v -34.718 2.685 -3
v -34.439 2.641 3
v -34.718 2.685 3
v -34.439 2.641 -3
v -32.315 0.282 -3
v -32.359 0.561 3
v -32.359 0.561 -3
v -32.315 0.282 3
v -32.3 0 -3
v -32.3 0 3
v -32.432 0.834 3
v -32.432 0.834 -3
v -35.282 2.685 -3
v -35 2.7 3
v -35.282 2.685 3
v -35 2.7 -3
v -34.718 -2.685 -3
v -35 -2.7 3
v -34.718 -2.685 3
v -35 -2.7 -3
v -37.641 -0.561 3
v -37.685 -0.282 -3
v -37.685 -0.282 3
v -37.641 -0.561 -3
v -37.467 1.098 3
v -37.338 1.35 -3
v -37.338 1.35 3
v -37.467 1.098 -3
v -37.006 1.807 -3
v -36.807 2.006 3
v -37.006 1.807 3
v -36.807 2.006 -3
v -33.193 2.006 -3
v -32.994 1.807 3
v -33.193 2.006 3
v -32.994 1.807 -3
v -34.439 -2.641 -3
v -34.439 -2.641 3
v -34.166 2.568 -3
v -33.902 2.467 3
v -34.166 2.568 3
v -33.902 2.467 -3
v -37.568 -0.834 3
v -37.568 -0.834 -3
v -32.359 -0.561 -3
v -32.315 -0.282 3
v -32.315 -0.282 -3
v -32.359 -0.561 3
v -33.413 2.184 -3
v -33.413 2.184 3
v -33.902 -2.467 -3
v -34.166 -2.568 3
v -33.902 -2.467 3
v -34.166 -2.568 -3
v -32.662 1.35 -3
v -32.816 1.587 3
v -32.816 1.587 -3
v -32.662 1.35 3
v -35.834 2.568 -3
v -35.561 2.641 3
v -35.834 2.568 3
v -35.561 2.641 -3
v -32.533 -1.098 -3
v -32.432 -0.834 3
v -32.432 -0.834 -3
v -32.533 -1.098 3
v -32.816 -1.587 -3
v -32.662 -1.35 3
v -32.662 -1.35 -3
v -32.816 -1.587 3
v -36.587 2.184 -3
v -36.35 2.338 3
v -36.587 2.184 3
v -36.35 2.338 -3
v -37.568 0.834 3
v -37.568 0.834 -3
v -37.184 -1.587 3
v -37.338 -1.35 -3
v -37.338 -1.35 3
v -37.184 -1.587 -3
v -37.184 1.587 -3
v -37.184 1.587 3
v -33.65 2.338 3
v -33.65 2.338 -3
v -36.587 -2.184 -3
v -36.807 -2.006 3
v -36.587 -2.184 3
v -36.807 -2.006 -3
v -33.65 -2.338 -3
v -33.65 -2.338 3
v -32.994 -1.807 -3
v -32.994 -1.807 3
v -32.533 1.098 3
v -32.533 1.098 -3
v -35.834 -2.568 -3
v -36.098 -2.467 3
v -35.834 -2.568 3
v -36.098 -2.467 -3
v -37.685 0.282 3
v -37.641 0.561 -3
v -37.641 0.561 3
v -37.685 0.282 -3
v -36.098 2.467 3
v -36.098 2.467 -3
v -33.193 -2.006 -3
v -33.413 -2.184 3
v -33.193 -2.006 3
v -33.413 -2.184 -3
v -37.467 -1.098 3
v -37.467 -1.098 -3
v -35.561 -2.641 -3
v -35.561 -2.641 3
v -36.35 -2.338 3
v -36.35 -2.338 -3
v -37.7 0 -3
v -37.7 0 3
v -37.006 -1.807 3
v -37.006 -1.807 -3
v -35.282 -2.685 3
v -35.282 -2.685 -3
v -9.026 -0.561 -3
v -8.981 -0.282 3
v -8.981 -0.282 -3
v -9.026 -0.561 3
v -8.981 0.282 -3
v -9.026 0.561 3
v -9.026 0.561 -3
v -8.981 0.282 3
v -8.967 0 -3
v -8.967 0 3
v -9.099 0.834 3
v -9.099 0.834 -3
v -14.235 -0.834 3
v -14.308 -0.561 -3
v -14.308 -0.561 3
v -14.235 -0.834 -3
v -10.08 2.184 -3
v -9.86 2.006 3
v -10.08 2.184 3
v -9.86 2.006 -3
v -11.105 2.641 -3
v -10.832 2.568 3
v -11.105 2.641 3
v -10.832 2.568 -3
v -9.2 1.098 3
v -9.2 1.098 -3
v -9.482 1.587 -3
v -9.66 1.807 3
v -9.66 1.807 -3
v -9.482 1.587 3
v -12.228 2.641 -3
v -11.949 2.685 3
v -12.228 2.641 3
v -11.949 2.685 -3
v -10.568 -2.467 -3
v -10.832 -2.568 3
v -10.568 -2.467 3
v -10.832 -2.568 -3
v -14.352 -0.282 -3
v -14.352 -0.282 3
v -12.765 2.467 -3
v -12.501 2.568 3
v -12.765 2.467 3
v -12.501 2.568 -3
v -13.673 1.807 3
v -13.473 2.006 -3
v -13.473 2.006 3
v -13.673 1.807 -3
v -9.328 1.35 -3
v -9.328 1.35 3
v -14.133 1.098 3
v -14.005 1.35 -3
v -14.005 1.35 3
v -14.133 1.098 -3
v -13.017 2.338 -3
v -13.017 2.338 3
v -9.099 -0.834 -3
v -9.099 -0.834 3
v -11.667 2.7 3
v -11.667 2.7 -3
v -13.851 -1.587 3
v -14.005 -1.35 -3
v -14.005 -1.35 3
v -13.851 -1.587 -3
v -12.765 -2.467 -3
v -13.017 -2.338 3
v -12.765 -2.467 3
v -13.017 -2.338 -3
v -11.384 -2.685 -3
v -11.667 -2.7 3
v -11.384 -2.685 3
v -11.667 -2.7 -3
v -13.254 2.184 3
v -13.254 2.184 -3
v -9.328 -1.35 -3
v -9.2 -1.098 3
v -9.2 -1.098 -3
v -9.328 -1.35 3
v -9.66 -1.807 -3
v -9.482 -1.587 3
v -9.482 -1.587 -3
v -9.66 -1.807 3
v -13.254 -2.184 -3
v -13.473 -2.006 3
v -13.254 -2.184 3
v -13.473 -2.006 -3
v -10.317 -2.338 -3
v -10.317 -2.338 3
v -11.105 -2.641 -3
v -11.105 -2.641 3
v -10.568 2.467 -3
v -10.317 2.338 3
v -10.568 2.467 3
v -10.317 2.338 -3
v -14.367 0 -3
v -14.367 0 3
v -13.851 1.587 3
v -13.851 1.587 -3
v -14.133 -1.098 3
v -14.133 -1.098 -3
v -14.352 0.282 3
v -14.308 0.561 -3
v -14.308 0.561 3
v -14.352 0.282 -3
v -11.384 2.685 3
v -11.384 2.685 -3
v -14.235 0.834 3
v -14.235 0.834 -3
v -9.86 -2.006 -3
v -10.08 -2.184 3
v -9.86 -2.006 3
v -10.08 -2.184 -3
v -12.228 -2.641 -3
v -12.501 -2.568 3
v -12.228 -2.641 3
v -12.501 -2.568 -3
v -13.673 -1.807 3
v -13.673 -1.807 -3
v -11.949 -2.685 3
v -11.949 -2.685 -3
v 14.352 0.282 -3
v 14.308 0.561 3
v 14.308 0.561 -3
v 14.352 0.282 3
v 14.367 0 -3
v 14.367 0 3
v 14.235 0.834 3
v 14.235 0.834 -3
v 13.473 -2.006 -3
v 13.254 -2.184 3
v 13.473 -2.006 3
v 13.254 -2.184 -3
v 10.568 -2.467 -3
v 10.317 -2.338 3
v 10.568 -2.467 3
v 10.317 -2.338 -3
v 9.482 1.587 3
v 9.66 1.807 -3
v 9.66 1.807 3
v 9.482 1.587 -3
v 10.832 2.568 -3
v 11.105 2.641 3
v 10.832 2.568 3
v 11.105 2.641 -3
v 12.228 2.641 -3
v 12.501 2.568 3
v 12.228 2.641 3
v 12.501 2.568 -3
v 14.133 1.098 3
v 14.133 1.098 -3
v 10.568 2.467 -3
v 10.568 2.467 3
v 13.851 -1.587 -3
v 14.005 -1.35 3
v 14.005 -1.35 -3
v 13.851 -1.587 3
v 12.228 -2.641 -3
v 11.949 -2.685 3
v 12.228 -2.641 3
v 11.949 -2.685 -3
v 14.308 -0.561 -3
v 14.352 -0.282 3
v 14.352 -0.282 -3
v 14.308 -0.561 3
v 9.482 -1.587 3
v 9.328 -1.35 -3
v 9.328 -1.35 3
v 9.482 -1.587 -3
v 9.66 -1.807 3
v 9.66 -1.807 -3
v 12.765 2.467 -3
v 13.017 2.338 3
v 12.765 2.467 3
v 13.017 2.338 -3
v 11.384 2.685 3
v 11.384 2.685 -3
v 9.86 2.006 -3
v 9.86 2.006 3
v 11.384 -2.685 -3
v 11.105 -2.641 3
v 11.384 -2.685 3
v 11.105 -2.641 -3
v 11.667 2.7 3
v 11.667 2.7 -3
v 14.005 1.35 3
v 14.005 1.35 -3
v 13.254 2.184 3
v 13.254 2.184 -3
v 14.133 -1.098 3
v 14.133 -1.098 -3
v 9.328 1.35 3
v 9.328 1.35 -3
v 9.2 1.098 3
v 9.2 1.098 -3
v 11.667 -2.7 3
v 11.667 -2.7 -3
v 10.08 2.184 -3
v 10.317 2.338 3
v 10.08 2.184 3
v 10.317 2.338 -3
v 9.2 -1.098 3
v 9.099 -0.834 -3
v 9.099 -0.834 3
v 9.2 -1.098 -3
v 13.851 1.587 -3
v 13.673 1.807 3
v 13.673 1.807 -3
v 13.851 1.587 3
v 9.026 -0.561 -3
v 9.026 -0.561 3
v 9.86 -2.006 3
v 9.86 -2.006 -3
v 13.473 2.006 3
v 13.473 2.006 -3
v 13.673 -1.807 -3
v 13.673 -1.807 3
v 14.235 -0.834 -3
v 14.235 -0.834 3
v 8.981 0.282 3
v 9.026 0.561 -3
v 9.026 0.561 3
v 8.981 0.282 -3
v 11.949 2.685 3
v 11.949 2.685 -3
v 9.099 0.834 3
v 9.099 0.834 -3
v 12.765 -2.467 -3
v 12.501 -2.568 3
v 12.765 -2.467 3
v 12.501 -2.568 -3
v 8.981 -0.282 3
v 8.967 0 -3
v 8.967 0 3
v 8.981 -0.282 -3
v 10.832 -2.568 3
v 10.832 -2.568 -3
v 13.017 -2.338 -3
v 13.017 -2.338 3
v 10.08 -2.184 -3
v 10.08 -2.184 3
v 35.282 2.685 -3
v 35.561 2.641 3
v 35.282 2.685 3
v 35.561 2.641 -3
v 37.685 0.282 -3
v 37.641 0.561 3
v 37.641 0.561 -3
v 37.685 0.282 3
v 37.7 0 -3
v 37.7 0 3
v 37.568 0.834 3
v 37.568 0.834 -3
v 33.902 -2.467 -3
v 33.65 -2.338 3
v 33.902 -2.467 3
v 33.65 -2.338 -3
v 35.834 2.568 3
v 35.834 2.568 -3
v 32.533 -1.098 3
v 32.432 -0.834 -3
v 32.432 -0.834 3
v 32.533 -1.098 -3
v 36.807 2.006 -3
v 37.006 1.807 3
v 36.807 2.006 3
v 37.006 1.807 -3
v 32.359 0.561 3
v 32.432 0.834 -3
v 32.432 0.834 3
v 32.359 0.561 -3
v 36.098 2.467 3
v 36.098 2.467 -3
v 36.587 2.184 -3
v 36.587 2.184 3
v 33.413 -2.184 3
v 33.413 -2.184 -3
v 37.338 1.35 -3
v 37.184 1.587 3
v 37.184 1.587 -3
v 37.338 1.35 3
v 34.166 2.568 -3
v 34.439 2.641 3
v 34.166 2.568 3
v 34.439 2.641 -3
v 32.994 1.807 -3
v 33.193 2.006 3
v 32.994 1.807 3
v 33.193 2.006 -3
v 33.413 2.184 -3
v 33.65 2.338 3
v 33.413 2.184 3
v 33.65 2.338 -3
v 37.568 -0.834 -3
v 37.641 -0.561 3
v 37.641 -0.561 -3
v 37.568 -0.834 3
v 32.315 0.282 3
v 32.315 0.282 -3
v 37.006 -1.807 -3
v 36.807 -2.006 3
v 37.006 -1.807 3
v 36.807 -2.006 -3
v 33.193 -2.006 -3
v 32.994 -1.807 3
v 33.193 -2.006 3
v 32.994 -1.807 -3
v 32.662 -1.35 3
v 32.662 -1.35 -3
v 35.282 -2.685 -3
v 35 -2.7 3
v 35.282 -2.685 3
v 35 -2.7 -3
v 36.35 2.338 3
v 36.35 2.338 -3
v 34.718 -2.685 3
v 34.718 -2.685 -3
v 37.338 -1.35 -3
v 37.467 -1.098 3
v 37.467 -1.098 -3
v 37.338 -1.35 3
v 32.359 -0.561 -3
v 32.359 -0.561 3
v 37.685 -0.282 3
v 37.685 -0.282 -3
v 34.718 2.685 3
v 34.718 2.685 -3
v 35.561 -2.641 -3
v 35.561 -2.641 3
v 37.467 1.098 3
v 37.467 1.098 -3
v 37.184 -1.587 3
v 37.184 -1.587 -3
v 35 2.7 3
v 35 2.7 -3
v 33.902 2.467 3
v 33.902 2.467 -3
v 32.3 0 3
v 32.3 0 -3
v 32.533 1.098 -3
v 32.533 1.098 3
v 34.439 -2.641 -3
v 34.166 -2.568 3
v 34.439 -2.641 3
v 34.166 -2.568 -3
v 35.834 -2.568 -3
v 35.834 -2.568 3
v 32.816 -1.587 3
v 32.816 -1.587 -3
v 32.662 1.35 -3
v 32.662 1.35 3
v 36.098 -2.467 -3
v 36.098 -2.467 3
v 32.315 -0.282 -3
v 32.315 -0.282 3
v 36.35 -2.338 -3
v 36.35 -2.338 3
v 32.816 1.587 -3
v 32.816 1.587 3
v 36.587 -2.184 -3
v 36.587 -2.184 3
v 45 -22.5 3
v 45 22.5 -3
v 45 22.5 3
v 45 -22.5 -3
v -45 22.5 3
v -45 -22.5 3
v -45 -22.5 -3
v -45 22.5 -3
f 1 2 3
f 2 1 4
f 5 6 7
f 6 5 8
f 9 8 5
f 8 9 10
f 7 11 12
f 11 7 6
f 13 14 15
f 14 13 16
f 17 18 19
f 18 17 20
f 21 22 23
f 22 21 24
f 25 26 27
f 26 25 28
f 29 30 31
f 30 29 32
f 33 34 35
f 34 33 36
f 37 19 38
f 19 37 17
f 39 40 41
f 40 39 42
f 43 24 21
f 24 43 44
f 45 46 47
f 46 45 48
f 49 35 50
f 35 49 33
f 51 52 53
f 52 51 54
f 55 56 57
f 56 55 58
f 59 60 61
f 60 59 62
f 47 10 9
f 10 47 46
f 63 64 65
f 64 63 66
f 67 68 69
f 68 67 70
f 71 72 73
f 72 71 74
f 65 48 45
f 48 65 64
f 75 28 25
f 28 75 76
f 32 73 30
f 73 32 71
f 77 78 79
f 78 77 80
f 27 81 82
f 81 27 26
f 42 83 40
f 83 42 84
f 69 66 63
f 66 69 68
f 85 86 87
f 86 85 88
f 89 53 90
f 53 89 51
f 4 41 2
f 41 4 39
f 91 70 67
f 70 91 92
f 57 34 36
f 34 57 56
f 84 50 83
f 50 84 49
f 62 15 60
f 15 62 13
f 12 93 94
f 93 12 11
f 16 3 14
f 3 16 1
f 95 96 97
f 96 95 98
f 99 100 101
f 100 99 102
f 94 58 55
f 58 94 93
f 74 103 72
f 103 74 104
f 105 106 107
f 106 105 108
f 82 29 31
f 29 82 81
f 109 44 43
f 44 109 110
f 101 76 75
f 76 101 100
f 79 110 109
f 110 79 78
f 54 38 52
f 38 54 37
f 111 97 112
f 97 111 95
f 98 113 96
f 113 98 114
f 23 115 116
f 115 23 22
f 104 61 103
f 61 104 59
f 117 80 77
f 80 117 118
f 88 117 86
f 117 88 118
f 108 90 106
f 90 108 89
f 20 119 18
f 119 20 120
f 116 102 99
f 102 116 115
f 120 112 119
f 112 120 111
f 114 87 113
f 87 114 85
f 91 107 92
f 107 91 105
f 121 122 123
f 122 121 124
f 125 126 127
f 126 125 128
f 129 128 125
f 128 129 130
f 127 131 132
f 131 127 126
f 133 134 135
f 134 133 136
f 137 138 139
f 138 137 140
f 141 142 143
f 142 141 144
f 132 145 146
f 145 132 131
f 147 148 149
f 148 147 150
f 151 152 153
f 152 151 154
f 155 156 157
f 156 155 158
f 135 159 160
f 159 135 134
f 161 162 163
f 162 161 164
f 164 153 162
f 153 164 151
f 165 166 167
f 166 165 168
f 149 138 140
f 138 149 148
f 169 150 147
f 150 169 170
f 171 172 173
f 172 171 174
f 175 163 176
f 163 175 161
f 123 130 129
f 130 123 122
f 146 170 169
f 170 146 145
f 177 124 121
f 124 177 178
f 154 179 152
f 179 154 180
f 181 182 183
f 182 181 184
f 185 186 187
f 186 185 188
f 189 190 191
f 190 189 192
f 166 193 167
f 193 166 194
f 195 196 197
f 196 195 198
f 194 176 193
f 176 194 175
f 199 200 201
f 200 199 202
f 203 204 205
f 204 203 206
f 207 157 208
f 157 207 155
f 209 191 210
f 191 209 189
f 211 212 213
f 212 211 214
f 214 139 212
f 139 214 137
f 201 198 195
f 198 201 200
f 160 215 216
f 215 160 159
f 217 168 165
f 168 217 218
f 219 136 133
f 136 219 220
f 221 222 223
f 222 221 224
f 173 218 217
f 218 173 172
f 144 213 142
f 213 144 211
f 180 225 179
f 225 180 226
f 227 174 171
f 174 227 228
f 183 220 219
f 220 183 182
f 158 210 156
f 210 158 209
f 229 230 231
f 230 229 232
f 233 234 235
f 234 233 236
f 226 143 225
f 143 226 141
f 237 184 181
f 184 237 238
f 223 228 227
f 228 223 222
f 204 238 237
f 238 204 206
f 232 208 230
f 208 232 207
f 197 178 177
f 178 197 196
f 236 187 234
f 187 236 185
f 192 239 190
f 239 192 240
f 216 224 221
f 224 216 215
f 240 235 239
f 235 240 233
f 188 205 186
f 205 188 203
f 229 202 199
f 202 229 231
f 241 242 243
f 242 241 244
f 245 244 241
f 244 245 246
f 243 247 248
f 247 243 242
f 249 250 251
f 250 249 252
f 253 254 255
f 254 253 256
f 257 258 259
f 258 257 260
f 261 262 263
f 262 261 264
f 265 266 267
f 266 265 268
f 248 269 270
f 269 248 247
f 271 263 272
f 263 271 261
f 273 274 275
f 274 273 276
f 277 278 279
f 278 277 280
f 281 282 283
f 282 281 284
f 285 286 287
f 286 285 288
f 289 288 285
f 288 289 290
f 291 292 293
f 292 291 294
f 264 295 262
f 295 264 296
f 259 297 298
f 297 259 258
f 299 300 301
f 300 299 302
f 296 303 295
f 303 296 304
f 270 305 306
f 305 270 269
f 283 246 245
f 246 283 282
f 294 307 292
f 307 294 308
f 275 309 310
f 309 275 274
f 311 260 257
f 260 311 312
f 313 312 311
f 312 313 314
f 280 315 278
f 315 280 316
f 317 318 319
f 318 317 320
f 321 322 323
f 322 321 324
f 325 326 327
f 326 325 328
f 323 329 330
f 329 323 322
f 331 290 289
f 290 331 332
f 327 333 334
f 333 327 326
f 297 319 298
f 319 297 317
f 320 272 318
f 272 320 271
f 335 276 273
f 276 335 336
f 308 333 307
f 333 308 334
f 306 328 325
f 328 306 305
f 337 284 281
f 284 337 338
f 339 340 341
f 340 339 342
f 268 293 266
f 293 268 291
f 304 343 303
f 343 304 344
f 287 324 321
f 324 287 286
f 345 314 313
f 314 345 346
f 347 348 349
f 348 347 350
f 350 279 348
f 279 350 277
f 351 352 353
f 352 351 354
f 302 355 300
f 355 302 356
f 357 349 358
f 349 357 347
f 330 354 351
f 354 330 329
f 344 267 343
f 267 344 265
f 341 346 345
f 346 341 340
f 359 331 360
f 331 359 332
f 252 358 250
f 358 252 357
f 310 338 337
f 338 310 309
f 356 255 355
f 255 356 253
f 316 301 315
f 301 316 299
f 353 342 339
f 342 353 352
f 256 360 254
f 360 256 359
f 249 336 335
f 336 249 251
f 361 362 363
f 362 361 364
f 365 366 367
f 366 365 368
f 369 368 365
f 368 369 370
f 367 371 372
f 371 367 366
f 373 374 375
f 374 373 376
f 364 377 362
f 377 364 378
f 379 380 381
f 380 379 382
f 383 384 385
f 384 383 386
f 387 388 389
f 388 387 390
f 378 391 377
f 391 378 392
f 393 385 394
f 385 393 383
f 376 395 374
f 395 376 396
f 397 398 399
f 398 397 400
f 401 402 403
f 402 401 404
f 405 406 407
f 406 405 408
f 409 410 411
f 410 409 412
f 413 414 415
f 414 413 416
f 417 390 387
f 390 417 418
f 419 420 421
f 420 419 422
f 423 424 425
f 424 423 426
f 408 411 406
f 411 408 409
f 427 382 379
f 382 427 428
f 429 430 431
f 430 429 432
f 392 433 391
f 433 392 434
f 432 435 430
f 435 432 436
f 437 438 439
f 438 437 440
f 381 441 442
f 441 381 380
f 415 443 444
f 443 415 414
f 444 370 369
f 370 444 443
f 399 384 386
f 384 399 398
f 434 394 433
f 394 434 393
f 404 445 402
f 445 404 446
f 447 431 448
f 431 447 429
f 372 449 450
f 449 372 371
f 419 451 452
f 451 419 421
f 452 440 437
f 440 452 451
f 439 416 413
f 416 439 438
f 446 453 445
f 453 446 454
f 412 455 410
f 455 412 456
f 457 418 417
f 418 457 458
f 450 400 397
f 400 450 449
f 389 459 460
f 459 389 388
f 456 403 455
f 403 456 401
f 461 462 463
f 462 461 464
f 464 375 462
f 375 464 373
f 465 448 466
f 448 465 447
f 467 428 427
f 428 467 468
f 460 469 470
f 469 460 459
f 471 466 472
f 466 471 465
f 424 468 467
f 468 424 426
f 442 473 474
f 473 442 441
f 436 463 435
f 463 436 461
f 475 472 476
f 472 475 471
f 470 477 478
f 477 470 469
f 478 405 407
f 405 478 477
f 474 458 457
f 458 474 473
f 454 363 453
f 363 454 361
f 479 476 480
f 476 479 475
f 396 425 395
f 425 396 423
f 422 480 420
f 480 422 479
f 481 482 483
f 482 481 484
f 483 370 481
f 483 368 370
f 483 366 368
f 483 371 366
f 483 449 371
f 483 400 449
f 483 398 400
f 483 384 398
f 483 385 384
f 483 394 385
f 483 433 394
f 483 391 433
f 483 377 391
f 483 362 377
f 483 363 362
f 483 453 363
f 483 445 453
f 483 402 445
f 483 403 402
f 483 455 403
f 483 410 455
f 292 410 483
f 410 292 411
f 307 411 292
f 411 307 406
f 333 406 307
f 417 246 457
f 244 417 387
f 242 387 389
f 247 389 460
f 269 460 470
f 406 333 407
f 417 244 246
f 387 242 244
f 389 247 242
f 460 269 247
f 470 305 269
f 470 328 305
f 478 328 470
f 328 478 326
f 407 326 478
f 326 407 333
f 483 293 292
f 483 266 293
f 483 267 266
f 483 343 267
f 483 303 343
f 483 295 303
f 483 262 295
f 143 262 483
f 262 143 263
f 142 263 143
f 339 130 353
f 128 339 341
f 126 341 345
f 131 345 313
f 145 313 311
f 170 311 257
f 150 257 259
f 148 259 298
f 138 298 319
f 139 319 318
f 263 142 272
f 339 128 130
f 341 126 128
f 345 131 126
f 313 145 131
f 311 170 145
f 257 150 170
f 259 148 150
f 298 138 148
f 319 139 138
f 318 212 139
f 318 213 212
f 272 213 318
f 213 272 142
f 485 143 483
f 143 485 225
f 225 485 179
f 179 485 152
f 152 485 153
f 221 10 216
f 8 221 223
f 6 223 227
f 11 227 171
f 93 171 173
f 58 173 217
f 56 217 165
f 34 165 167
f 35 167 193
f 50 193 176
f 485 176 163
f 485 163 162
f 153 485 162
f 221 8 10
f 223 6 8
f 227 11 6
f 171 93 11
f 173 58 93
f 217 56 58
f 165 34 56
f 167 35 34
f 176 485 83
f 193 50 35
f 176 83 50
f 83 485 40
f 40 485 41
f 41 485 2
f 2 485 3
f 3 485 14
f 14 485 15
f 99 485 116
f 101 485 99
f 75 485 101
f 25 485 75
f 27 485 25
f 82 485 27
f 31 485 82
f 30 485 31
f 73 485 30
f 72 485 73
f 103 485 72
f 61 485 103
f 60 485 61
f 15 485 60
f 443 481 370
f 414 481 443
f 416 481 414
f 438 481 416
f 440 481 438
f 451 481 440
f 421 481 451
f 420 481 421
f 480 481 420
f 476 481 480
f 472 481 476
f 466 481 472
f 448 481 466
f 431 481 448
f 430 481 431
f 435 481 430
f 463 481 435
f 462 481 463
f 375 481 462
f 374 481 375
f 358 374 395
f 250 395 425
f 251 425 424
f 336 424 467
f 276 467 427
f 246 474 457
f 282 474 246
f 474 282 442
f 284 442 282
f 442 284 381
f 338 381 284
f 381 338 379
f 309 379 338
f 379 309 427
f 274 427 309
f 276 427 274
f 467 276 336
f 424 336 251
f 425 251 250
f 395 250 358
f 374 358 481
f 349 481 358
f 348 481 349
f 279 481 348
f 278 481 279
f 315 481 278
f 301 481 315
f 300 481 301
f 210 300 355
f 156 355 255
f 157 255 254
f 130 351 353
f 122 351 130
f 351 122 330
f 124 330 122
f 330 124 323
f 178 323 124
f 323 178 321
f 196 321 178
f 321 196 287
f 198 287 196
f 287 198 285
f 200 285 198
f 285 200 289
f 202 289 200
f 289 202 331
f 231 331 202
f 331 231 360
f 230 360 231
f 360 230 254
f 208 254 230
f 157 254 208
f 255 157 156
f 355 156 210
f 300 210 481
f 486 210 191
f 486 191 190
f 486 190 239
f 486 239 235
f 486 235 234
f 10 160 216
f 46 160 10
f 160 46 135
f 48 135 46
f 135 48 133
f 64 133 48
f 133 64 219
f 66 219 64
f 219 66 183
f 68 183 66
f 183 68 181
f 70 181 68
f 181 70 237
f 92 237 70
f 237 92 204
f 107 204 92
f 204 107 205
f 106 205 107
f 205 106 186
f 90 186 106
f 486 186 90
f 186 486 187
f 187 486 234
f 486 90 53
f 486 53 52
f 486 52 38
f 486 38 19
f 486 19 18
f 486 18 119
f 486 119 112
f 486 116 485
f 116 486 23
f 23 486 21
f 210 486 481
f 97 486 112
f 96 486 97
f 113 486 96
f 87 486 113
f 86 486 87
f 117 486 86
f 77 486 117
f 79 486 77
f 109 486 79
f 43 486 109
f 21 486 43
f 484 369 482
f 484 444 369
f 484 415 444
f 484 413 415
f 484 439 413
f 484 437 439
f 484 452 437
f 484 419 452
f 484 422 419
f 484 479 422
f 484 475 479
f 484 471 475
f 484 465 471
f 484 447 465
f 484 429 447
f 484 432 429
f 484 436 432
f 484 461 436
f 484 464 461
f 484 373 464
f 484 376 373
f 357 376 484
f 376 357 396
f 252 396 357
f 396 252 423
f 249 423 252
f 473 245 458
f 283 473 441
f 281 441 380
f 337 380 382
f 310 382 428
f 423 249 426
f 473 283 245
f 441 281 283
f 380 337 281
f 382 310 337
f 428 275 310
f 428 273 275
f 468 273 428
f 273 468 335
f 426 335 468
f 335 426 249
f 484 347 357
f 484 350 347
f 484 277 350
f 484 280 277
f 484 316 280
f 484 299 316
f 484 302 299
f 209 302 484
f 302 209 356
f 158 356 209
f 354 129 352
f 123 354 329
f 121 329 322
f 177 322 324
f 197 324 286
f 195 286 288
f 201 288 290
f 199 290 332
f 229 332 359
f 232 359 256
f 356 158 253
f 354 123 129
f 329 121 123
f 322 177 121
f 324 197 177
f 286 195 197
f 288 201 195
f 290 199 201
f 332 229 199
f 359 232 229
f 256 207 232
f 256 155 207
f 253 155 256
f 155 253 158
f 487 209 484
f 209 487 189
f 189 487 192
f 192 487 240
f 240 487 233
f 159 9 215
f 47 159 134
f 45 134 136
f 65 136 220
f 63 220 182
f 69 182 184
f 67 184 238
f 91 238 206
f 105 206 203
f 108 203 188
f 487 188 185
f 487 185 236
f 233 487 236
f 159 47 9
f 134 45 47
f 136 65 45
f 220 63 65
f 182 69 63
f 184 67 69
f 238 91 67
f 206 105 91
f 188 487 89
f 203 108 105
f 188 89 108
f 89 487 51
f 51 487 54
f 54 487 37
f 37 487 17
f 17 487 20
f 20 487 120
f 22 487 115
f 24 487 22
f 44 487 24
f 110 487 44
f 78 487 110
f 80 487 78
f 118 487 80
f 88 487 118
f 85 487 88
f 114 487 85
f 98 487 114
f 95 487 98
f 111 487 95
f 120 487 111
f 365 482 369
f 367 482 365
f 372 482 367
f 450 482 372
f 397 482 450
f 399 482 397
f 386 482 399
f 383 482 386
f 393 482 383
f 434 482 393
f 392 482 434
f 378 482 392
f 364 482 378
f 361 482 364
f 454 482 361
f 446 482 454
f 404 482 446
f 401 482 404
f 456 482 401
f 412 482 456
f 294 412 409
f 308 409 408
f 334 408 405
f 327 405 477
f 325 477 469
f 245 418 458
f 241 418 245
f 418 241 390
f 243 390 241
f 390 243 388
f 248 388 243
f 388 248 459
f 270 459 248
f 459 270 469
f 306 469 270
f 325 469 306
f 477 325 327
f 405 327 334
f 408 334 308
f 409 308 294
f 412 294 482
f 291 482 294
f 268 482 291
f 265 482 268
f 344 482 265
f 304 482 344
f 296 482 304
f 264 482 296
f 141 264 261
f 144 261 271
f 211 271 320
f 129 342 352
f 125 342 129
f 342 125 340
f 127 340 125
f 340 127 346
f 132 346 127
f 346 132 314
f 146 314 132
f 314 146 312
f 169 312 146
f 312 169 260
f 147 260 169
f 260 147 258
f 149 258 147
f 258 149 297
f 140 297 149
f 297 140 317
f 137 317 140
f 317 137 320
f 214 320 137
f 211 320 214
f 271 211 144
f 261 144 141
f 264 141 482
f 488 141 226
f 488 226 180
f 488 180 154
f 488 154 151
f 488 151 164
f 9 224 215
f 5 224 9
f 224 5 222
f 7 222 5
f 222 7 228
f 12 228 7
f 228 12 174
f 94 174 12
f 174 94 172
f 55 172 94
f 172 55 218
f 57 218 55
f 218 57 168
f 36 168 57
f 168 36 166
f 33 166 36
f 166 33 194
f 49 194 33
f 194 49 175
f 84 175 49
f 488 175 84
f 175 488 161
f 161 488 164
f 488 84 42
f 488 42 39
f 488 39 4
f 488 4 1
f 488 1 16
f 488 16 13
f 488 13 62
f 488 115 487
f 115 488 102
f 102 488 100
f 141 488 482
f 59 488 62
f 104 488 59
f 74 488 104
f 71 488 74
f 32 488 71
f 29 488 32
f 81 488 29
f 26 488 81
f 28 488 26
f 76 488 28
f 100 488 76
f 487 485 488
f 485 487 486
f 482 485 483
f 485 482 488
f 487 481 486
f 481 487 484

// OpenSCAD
// Multi-hole mounting plate.
$fn = 60;
eps = 0.02;
plate_l = 90;
plate_w = 45;
plate_t = 6;
hole_d = 5.4;
edge = 10;
difference() {
    cube([plate_l, plate_w, plate_t], center = true);
    for (i = [0 : 3])
        translate([-plate_l / 2 + edge + i * (plate_l - 2 * edge) / max(1, 3), 0, -plate_t / 2 - eps])
            cylinder(d = hole_d, h = plate_t + 2 * eps);
}
